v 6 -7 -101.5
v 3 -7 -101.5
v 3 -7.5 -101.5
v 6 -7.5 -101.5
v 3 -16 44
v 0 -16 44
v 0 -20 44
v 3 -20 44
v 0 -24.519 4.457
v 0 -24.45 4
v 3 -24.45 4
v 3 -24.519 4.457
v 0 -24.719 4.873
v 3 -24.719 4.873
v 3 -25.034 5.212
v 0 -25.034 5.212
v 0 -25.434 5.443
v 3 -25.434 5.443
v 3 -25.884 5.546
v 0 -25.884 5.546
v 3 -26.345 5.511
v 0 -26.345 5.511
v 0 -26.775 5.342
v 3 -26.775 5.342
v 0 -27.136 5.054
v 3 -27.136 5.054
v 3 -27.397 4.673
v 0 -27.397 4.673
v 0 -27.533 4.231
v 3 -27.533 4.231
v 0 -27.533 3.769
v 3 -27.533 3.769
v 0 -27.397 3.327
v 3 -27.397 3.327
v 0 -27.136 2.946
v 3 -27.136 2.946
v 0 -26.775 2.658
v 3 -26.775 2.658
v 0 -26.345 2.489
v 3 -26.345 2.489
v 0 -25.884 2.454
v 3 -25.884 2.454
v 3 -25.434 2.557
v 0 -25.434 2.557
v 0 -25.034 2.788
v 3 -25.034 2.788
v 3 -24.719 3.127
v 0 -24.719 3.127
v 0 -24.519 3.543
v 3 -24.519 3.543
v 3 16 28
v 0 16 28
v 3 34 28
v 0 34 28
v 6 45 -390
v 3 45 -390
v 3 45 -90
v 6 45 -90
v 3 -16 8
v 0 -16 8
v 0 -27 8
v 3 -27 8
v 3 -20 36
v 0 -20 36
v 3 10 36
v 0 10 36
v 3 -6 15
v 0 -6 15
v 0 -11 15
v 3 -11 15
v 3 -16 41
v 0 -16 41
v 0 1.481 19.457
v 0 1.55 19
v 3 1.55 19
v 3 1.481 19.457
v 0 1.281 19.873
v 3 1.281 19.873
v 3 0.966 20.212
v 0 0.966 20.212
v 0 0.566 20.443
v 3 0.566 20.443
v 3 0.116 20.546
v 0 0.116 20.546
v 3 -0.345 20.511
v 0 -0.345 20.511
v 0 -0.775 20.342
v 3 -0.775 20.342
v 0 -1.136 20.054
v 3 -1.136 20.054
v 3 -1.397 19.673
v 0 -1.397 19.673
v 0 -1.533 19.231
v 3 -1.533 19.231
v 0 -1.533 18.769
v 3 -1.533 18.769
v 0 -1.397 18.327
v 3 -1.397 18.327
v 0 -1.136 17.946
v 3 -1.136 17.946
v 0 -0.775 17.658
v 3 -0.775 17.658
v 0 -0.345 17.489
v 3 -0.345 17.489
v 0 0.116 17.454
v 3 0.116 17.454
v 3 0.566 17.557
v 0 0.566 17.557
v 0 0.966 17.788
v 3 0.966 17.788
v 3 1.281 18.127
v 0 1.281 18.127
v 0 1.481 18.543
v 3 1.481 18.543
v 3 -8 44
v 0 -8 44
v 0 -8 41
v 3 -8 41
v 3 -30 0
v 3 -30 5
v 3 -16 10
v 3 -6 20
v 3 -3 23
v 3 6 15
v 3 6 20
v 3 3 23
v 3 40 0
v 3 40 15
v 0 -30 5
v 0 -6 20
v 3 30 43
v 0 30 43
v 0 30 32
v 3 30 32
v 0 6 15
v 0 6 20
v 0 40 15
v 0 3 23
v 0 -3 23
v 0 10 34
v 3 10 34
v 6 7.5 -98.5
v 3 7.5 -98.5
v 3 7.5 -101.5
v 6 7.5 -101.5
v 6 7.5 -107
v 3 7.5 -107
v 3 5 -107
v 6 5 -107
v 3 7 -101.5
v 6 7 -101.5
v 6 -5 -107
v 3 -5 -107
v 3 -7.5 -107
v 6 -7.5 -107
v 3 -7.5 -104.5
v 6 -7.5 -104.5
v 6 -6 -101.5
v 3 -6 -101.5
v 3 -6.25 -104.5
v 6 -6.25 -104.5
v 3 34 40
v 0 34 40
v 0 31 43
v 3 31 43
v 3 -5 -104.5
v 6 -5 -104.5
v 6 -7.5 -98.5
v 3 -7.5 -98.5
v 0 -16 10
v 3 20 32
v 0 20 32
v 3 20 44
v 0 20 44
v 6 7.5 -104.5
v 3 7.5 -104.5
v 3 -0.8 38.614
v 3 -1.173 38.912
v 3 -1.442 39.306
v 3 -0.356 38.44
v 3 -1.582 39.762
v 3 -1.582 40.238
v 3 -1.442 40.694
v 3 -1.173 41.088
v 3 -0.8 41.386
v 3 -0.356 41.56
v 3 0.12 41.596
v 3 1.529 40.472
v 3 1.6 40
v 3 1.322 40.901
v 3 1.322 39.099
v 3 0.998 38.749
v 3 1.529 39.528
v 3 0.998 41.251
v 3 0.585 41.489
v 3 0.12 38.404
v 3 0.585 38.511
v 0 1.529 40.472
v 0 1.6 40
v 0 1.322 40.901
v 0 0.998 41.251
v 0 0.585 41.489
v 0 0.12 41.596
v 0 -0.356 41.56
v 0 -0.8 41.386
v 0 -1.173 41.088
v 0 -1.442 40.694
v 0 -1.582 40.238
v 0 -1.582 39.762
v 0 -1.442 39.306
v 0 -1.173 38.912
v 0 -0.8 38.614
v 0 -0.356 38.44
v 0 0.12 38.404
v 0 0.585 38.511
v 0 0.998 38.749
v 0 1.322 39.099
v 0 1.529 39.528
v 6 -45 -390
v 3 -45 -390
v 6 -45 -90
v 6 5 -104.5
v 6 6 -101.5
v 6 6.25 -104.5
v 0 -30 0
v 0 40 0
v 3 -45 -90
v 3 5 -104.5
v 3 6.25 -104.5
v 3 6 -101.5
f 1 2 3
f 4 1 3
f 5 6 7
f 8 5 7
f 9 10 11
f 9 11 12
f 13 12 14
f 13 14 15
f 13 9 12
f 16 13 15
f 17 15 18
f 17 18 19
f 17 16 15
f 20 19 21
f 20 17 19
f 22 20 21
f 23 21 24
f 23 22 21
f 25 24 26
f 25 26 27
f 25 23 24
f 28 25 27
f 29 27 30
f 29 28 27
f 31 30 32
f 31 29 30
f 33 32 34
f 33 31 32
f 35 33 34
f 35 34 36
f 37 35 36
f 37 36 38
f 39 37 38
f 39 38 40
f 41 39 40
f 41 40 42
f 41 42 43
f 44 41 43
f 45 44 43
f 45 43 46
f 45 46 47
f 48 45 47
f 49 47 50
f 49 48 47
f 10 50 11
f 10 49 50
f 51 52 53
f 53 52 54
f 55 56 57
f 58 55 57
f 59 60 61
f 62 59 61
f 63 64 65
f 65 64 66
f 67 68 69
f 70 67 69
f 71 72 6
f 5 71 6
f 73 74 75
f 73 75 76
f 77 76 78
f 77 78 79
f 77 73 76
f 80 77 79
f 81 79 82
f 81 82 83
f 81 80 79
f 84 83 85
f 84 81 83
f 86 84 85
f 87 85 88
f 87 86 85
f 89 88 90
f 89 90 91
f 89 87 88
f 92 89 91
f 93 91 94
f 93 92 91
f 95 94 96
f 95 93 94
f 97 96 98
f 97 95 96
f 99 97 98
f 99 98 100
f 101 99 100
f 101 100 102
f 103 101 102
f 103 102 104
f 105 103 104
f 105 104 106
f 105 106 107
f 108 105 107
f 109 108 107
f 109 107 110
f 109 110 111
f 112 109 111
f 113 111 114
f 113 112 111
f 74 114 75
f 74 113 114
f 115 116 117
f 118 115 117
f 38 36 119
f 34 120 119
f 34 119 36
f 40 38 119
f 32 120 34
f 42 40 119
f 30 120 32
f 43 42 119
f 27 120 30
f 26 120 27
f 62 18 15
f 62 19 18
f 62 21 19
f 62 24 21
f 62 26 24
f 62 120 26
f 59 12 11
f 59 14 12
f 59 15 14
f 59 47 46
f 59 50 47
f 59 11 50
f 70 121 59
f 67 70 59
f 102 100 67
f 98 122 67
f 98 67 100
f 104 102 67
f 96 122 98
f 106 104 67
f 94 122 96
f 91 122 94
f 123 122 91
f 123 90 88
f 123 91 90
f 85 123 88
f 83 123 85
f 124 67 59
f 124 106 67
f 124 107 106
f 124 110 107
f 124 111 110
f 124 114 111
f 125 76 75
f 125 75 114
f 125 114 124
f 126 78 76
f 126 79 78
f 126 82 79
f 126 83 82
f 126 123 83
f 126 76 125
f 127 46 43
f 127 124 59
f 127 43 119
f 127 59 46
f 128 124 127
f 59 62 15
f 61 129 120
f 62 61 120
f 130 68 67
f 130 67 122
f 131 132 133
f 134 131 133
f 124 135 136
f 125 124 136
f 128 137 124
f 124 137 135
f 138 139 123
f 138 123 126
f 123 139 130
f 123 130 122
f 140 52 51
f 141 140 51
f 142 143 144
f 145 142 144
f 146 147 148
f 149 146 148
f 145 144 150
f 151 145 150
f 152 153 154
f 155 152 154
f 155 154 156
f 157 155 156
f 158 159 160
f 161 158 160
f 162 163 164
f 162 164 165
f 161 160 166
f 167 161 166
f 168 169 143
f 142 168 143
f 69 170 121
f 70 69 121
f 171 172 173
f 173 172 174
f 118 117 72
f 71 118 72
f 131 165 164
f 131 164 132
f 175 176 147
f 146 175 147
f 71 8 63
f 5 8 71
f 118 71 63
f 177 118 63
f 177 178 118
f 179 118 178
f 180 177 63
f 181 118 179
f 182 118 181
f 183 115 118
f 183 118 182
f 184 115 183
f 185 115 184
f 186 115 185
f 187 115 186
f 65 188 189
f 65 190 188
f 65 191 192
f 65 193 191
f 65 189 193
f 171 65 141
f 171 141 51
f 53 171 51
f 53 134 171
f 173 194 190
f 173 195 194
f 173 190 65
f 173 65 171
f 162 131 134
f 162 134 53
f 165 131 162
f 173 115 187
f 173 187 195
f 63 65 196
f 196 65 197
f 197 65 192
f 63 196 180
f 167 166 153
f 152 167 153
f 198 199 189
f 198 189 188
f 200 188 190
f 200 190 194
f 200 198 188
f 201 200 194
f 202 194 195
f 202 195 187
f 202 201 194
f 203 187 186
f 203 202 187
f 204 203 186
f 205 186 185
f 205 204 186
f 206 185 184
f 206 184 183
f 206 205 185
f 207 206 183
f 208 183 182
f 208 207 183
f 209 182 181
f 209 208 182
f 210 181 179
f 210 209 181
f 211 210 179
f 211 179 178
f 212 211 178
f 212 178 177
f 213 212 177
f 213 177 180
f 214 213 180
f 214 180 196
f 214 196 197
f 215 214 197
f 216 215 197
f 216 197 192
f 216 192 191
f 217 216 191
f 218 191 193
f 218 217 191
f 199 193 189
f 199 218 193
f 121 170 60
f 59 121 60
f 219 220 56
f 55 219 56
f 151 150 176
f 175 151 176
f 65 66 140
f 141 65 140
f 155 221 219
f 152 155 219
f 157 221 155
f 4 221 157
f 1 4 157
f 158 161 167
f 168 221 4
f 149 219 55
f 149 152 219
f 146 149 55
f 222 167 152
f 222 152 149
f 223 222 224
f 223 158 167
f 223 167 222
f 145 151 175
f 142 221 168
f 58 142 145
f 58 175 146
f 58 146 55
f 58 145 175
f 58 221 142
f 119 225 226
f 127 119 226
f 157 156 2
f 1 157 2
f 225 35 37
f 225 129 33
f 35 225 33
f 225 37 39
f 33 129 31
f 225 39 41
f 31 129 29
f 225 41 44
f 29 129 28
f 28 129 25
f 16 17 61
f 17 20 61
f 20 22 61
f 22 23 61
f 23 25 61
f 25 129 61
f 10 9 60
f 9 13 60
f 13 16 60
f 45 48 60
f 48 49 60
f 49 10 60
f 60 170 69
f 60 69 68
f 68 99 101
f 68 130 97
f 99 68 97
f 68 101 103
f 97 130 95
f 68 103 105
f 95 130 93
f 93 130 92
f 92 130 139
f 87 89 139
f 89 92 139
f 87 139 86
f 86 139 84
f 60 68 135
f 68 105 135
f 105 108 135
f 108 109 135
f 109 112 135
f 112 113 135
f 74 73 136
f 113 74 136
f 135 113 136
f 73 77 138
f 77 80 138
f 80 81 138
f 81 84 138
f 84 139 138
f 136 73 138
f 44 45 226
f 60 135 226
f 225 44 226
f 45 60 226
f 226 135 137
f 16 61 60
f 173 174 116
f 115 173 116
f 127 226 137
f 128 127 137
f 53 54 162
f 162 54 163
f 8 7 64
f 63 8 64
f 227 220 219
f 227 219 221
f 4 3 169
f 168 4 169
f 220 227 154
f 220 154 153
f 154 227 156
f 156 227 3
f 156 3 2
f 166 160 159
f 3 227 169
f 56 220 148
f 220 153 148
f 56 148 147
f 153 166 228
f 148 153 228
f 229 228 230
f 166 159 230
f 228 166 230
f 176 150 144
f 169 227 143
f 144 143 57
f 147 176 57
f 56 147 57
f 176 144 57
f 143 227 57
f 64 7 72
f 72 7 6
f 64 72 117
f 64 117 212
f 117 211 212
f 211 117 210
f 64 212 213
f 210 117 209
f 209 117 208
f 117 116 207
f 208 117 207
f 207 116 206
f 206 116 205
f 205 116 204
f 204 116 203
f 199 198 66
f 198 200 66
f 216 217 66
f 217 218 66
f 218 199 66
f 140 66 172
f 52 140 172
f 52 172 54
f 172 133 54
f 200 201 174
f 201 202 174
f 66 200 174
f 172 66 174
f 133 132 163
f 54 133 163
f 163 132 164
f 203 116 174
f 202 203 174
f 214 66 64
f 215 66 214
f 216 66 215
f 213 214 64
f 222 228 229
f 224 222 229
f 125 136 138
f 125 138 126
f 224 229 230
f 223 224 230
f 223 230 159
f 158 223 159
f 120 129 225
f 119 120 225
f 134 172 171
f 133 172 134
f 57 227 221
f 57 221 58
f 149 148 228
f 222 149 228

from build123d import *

# Parameters (mm, degrees)
F0_R      = 1.55
F0_W      = 12
F0_H      = 8
F1_DEPTH  = 3
F2_R      = 1.6
F2_W      = 10
F2_H      = 4
F3_DEPTH  = 3
F4_SIZE   = 3
F5_SIZE   = 6
F6_SIZE   = 3
F7_SIZE   = 5
F8_SIZE   = 3
F9_W      = 90
F9_H      = 300
F10_DEPTH = 3


with BuildPart() as f1:
    # F0 (on Right) → F1 (new body)
    with BuildSketch(Plane.YZ):
        Polygon((-6, 15), (-16, 15), (-16, 8), (-30, 8), (-30, 0), (40, 0), (40, 15), (6, 15), align=None)
        with Locations((-26, 4)):
            Circle(F0_R, mode=Mode.SUBTRACT)
        with Locations((0, 19)):
            Rectangle(F0_W, F0_H)
        with Locations((0, 19)):
            Circle(F0_R, mode=Mode.SUBTRACT)
    extrude(amount=F1_DEPTH)

    # F4
    f4_edges = [f1.edges().sort_by_distance(p)[0] for p in [
        (1.5, -6, 23),
        (1.5, 6, 23),
    ]]
    chamfer(f4_edges, length=F4_SIZE)

    # F7
    f7_edges = [f1.edges().sort_by_distance(p)[0] for p in [
        (1.5, -16, 15),
    ]]
    chamfer(f7_edges, length=F7_SIZE)

    # F8
    f8_edges = [f1.edges().sort_by_distance(p)[0] for p in [
        (1.5, -30, 8),
    ]]
    chamfer(f8_edges, length=F8_SIZE)


with BuildPart() as f3:
    # F2 (on Right) → F3 (new body)
    with BuildSketch(Plane.YZ):
        Polygon((-16, 44), (-20, 44), (-20, 36), (10, 36), (20, 36), (20, 44), (-8, 44), (-8, 41), (-16, 41), align=None)
        with Locations((0, 40)):
            Circle(F2_R, mode=Mode.SUBTRACT)
        Polygon((20, 36), (10, 36), (10, 28), (20, 28), (20, 32), align=None)
        with Locations((25, 30)):
            Rectangle(F2_W, F2_H)
        Polygon((30, 43), (30, 32), (30, 28), (34, 28), (34, 43), align=None)
    extrude(amount=F3_DEPTH)

    # F5
    f5_edges = [f3.edges().sort_by_distance(p)[0] for p in [
        (1.5, 10, 28),
    ]]
    chamfer(f5_edges, length=F5_SIZE)

    # F6
    f6_edges = [f3.edges().sort_by_distance(p)[0] for p in [
        (1.5, 34, 43),
    ]]
    chamfer(f6_edges, length=F6_SIZE)


with BuildPart() as f10:
    # F9 (on face) → F10 (new body)
    with BuildSketch(Plane.YZ.offset(3)):
        with Locations((0, -240)):
            Rectangle(F9_W, F9_H)
        Polygon((-7.5, -98.5), (7.5, -98.5), (7.5, -101.5), (7, -101.5), (7.5, -104.5), (7.5, -107), (5, -107), (5, -104.5), (6.25, -104.5), (6, -101.5), (-6, -101.5), (-6.25, -104.5), (-5, -104.5), (-5, -107), (-7.5, -107), (-7.5, -104.5), (-7, -101.5), (-7.5, -101.5), align=None, mode=Mode.SUBTRACT)
    extrude(amount=F10_DEPTH)


solid = Compound([f1.part, f3.part, f10.part])
